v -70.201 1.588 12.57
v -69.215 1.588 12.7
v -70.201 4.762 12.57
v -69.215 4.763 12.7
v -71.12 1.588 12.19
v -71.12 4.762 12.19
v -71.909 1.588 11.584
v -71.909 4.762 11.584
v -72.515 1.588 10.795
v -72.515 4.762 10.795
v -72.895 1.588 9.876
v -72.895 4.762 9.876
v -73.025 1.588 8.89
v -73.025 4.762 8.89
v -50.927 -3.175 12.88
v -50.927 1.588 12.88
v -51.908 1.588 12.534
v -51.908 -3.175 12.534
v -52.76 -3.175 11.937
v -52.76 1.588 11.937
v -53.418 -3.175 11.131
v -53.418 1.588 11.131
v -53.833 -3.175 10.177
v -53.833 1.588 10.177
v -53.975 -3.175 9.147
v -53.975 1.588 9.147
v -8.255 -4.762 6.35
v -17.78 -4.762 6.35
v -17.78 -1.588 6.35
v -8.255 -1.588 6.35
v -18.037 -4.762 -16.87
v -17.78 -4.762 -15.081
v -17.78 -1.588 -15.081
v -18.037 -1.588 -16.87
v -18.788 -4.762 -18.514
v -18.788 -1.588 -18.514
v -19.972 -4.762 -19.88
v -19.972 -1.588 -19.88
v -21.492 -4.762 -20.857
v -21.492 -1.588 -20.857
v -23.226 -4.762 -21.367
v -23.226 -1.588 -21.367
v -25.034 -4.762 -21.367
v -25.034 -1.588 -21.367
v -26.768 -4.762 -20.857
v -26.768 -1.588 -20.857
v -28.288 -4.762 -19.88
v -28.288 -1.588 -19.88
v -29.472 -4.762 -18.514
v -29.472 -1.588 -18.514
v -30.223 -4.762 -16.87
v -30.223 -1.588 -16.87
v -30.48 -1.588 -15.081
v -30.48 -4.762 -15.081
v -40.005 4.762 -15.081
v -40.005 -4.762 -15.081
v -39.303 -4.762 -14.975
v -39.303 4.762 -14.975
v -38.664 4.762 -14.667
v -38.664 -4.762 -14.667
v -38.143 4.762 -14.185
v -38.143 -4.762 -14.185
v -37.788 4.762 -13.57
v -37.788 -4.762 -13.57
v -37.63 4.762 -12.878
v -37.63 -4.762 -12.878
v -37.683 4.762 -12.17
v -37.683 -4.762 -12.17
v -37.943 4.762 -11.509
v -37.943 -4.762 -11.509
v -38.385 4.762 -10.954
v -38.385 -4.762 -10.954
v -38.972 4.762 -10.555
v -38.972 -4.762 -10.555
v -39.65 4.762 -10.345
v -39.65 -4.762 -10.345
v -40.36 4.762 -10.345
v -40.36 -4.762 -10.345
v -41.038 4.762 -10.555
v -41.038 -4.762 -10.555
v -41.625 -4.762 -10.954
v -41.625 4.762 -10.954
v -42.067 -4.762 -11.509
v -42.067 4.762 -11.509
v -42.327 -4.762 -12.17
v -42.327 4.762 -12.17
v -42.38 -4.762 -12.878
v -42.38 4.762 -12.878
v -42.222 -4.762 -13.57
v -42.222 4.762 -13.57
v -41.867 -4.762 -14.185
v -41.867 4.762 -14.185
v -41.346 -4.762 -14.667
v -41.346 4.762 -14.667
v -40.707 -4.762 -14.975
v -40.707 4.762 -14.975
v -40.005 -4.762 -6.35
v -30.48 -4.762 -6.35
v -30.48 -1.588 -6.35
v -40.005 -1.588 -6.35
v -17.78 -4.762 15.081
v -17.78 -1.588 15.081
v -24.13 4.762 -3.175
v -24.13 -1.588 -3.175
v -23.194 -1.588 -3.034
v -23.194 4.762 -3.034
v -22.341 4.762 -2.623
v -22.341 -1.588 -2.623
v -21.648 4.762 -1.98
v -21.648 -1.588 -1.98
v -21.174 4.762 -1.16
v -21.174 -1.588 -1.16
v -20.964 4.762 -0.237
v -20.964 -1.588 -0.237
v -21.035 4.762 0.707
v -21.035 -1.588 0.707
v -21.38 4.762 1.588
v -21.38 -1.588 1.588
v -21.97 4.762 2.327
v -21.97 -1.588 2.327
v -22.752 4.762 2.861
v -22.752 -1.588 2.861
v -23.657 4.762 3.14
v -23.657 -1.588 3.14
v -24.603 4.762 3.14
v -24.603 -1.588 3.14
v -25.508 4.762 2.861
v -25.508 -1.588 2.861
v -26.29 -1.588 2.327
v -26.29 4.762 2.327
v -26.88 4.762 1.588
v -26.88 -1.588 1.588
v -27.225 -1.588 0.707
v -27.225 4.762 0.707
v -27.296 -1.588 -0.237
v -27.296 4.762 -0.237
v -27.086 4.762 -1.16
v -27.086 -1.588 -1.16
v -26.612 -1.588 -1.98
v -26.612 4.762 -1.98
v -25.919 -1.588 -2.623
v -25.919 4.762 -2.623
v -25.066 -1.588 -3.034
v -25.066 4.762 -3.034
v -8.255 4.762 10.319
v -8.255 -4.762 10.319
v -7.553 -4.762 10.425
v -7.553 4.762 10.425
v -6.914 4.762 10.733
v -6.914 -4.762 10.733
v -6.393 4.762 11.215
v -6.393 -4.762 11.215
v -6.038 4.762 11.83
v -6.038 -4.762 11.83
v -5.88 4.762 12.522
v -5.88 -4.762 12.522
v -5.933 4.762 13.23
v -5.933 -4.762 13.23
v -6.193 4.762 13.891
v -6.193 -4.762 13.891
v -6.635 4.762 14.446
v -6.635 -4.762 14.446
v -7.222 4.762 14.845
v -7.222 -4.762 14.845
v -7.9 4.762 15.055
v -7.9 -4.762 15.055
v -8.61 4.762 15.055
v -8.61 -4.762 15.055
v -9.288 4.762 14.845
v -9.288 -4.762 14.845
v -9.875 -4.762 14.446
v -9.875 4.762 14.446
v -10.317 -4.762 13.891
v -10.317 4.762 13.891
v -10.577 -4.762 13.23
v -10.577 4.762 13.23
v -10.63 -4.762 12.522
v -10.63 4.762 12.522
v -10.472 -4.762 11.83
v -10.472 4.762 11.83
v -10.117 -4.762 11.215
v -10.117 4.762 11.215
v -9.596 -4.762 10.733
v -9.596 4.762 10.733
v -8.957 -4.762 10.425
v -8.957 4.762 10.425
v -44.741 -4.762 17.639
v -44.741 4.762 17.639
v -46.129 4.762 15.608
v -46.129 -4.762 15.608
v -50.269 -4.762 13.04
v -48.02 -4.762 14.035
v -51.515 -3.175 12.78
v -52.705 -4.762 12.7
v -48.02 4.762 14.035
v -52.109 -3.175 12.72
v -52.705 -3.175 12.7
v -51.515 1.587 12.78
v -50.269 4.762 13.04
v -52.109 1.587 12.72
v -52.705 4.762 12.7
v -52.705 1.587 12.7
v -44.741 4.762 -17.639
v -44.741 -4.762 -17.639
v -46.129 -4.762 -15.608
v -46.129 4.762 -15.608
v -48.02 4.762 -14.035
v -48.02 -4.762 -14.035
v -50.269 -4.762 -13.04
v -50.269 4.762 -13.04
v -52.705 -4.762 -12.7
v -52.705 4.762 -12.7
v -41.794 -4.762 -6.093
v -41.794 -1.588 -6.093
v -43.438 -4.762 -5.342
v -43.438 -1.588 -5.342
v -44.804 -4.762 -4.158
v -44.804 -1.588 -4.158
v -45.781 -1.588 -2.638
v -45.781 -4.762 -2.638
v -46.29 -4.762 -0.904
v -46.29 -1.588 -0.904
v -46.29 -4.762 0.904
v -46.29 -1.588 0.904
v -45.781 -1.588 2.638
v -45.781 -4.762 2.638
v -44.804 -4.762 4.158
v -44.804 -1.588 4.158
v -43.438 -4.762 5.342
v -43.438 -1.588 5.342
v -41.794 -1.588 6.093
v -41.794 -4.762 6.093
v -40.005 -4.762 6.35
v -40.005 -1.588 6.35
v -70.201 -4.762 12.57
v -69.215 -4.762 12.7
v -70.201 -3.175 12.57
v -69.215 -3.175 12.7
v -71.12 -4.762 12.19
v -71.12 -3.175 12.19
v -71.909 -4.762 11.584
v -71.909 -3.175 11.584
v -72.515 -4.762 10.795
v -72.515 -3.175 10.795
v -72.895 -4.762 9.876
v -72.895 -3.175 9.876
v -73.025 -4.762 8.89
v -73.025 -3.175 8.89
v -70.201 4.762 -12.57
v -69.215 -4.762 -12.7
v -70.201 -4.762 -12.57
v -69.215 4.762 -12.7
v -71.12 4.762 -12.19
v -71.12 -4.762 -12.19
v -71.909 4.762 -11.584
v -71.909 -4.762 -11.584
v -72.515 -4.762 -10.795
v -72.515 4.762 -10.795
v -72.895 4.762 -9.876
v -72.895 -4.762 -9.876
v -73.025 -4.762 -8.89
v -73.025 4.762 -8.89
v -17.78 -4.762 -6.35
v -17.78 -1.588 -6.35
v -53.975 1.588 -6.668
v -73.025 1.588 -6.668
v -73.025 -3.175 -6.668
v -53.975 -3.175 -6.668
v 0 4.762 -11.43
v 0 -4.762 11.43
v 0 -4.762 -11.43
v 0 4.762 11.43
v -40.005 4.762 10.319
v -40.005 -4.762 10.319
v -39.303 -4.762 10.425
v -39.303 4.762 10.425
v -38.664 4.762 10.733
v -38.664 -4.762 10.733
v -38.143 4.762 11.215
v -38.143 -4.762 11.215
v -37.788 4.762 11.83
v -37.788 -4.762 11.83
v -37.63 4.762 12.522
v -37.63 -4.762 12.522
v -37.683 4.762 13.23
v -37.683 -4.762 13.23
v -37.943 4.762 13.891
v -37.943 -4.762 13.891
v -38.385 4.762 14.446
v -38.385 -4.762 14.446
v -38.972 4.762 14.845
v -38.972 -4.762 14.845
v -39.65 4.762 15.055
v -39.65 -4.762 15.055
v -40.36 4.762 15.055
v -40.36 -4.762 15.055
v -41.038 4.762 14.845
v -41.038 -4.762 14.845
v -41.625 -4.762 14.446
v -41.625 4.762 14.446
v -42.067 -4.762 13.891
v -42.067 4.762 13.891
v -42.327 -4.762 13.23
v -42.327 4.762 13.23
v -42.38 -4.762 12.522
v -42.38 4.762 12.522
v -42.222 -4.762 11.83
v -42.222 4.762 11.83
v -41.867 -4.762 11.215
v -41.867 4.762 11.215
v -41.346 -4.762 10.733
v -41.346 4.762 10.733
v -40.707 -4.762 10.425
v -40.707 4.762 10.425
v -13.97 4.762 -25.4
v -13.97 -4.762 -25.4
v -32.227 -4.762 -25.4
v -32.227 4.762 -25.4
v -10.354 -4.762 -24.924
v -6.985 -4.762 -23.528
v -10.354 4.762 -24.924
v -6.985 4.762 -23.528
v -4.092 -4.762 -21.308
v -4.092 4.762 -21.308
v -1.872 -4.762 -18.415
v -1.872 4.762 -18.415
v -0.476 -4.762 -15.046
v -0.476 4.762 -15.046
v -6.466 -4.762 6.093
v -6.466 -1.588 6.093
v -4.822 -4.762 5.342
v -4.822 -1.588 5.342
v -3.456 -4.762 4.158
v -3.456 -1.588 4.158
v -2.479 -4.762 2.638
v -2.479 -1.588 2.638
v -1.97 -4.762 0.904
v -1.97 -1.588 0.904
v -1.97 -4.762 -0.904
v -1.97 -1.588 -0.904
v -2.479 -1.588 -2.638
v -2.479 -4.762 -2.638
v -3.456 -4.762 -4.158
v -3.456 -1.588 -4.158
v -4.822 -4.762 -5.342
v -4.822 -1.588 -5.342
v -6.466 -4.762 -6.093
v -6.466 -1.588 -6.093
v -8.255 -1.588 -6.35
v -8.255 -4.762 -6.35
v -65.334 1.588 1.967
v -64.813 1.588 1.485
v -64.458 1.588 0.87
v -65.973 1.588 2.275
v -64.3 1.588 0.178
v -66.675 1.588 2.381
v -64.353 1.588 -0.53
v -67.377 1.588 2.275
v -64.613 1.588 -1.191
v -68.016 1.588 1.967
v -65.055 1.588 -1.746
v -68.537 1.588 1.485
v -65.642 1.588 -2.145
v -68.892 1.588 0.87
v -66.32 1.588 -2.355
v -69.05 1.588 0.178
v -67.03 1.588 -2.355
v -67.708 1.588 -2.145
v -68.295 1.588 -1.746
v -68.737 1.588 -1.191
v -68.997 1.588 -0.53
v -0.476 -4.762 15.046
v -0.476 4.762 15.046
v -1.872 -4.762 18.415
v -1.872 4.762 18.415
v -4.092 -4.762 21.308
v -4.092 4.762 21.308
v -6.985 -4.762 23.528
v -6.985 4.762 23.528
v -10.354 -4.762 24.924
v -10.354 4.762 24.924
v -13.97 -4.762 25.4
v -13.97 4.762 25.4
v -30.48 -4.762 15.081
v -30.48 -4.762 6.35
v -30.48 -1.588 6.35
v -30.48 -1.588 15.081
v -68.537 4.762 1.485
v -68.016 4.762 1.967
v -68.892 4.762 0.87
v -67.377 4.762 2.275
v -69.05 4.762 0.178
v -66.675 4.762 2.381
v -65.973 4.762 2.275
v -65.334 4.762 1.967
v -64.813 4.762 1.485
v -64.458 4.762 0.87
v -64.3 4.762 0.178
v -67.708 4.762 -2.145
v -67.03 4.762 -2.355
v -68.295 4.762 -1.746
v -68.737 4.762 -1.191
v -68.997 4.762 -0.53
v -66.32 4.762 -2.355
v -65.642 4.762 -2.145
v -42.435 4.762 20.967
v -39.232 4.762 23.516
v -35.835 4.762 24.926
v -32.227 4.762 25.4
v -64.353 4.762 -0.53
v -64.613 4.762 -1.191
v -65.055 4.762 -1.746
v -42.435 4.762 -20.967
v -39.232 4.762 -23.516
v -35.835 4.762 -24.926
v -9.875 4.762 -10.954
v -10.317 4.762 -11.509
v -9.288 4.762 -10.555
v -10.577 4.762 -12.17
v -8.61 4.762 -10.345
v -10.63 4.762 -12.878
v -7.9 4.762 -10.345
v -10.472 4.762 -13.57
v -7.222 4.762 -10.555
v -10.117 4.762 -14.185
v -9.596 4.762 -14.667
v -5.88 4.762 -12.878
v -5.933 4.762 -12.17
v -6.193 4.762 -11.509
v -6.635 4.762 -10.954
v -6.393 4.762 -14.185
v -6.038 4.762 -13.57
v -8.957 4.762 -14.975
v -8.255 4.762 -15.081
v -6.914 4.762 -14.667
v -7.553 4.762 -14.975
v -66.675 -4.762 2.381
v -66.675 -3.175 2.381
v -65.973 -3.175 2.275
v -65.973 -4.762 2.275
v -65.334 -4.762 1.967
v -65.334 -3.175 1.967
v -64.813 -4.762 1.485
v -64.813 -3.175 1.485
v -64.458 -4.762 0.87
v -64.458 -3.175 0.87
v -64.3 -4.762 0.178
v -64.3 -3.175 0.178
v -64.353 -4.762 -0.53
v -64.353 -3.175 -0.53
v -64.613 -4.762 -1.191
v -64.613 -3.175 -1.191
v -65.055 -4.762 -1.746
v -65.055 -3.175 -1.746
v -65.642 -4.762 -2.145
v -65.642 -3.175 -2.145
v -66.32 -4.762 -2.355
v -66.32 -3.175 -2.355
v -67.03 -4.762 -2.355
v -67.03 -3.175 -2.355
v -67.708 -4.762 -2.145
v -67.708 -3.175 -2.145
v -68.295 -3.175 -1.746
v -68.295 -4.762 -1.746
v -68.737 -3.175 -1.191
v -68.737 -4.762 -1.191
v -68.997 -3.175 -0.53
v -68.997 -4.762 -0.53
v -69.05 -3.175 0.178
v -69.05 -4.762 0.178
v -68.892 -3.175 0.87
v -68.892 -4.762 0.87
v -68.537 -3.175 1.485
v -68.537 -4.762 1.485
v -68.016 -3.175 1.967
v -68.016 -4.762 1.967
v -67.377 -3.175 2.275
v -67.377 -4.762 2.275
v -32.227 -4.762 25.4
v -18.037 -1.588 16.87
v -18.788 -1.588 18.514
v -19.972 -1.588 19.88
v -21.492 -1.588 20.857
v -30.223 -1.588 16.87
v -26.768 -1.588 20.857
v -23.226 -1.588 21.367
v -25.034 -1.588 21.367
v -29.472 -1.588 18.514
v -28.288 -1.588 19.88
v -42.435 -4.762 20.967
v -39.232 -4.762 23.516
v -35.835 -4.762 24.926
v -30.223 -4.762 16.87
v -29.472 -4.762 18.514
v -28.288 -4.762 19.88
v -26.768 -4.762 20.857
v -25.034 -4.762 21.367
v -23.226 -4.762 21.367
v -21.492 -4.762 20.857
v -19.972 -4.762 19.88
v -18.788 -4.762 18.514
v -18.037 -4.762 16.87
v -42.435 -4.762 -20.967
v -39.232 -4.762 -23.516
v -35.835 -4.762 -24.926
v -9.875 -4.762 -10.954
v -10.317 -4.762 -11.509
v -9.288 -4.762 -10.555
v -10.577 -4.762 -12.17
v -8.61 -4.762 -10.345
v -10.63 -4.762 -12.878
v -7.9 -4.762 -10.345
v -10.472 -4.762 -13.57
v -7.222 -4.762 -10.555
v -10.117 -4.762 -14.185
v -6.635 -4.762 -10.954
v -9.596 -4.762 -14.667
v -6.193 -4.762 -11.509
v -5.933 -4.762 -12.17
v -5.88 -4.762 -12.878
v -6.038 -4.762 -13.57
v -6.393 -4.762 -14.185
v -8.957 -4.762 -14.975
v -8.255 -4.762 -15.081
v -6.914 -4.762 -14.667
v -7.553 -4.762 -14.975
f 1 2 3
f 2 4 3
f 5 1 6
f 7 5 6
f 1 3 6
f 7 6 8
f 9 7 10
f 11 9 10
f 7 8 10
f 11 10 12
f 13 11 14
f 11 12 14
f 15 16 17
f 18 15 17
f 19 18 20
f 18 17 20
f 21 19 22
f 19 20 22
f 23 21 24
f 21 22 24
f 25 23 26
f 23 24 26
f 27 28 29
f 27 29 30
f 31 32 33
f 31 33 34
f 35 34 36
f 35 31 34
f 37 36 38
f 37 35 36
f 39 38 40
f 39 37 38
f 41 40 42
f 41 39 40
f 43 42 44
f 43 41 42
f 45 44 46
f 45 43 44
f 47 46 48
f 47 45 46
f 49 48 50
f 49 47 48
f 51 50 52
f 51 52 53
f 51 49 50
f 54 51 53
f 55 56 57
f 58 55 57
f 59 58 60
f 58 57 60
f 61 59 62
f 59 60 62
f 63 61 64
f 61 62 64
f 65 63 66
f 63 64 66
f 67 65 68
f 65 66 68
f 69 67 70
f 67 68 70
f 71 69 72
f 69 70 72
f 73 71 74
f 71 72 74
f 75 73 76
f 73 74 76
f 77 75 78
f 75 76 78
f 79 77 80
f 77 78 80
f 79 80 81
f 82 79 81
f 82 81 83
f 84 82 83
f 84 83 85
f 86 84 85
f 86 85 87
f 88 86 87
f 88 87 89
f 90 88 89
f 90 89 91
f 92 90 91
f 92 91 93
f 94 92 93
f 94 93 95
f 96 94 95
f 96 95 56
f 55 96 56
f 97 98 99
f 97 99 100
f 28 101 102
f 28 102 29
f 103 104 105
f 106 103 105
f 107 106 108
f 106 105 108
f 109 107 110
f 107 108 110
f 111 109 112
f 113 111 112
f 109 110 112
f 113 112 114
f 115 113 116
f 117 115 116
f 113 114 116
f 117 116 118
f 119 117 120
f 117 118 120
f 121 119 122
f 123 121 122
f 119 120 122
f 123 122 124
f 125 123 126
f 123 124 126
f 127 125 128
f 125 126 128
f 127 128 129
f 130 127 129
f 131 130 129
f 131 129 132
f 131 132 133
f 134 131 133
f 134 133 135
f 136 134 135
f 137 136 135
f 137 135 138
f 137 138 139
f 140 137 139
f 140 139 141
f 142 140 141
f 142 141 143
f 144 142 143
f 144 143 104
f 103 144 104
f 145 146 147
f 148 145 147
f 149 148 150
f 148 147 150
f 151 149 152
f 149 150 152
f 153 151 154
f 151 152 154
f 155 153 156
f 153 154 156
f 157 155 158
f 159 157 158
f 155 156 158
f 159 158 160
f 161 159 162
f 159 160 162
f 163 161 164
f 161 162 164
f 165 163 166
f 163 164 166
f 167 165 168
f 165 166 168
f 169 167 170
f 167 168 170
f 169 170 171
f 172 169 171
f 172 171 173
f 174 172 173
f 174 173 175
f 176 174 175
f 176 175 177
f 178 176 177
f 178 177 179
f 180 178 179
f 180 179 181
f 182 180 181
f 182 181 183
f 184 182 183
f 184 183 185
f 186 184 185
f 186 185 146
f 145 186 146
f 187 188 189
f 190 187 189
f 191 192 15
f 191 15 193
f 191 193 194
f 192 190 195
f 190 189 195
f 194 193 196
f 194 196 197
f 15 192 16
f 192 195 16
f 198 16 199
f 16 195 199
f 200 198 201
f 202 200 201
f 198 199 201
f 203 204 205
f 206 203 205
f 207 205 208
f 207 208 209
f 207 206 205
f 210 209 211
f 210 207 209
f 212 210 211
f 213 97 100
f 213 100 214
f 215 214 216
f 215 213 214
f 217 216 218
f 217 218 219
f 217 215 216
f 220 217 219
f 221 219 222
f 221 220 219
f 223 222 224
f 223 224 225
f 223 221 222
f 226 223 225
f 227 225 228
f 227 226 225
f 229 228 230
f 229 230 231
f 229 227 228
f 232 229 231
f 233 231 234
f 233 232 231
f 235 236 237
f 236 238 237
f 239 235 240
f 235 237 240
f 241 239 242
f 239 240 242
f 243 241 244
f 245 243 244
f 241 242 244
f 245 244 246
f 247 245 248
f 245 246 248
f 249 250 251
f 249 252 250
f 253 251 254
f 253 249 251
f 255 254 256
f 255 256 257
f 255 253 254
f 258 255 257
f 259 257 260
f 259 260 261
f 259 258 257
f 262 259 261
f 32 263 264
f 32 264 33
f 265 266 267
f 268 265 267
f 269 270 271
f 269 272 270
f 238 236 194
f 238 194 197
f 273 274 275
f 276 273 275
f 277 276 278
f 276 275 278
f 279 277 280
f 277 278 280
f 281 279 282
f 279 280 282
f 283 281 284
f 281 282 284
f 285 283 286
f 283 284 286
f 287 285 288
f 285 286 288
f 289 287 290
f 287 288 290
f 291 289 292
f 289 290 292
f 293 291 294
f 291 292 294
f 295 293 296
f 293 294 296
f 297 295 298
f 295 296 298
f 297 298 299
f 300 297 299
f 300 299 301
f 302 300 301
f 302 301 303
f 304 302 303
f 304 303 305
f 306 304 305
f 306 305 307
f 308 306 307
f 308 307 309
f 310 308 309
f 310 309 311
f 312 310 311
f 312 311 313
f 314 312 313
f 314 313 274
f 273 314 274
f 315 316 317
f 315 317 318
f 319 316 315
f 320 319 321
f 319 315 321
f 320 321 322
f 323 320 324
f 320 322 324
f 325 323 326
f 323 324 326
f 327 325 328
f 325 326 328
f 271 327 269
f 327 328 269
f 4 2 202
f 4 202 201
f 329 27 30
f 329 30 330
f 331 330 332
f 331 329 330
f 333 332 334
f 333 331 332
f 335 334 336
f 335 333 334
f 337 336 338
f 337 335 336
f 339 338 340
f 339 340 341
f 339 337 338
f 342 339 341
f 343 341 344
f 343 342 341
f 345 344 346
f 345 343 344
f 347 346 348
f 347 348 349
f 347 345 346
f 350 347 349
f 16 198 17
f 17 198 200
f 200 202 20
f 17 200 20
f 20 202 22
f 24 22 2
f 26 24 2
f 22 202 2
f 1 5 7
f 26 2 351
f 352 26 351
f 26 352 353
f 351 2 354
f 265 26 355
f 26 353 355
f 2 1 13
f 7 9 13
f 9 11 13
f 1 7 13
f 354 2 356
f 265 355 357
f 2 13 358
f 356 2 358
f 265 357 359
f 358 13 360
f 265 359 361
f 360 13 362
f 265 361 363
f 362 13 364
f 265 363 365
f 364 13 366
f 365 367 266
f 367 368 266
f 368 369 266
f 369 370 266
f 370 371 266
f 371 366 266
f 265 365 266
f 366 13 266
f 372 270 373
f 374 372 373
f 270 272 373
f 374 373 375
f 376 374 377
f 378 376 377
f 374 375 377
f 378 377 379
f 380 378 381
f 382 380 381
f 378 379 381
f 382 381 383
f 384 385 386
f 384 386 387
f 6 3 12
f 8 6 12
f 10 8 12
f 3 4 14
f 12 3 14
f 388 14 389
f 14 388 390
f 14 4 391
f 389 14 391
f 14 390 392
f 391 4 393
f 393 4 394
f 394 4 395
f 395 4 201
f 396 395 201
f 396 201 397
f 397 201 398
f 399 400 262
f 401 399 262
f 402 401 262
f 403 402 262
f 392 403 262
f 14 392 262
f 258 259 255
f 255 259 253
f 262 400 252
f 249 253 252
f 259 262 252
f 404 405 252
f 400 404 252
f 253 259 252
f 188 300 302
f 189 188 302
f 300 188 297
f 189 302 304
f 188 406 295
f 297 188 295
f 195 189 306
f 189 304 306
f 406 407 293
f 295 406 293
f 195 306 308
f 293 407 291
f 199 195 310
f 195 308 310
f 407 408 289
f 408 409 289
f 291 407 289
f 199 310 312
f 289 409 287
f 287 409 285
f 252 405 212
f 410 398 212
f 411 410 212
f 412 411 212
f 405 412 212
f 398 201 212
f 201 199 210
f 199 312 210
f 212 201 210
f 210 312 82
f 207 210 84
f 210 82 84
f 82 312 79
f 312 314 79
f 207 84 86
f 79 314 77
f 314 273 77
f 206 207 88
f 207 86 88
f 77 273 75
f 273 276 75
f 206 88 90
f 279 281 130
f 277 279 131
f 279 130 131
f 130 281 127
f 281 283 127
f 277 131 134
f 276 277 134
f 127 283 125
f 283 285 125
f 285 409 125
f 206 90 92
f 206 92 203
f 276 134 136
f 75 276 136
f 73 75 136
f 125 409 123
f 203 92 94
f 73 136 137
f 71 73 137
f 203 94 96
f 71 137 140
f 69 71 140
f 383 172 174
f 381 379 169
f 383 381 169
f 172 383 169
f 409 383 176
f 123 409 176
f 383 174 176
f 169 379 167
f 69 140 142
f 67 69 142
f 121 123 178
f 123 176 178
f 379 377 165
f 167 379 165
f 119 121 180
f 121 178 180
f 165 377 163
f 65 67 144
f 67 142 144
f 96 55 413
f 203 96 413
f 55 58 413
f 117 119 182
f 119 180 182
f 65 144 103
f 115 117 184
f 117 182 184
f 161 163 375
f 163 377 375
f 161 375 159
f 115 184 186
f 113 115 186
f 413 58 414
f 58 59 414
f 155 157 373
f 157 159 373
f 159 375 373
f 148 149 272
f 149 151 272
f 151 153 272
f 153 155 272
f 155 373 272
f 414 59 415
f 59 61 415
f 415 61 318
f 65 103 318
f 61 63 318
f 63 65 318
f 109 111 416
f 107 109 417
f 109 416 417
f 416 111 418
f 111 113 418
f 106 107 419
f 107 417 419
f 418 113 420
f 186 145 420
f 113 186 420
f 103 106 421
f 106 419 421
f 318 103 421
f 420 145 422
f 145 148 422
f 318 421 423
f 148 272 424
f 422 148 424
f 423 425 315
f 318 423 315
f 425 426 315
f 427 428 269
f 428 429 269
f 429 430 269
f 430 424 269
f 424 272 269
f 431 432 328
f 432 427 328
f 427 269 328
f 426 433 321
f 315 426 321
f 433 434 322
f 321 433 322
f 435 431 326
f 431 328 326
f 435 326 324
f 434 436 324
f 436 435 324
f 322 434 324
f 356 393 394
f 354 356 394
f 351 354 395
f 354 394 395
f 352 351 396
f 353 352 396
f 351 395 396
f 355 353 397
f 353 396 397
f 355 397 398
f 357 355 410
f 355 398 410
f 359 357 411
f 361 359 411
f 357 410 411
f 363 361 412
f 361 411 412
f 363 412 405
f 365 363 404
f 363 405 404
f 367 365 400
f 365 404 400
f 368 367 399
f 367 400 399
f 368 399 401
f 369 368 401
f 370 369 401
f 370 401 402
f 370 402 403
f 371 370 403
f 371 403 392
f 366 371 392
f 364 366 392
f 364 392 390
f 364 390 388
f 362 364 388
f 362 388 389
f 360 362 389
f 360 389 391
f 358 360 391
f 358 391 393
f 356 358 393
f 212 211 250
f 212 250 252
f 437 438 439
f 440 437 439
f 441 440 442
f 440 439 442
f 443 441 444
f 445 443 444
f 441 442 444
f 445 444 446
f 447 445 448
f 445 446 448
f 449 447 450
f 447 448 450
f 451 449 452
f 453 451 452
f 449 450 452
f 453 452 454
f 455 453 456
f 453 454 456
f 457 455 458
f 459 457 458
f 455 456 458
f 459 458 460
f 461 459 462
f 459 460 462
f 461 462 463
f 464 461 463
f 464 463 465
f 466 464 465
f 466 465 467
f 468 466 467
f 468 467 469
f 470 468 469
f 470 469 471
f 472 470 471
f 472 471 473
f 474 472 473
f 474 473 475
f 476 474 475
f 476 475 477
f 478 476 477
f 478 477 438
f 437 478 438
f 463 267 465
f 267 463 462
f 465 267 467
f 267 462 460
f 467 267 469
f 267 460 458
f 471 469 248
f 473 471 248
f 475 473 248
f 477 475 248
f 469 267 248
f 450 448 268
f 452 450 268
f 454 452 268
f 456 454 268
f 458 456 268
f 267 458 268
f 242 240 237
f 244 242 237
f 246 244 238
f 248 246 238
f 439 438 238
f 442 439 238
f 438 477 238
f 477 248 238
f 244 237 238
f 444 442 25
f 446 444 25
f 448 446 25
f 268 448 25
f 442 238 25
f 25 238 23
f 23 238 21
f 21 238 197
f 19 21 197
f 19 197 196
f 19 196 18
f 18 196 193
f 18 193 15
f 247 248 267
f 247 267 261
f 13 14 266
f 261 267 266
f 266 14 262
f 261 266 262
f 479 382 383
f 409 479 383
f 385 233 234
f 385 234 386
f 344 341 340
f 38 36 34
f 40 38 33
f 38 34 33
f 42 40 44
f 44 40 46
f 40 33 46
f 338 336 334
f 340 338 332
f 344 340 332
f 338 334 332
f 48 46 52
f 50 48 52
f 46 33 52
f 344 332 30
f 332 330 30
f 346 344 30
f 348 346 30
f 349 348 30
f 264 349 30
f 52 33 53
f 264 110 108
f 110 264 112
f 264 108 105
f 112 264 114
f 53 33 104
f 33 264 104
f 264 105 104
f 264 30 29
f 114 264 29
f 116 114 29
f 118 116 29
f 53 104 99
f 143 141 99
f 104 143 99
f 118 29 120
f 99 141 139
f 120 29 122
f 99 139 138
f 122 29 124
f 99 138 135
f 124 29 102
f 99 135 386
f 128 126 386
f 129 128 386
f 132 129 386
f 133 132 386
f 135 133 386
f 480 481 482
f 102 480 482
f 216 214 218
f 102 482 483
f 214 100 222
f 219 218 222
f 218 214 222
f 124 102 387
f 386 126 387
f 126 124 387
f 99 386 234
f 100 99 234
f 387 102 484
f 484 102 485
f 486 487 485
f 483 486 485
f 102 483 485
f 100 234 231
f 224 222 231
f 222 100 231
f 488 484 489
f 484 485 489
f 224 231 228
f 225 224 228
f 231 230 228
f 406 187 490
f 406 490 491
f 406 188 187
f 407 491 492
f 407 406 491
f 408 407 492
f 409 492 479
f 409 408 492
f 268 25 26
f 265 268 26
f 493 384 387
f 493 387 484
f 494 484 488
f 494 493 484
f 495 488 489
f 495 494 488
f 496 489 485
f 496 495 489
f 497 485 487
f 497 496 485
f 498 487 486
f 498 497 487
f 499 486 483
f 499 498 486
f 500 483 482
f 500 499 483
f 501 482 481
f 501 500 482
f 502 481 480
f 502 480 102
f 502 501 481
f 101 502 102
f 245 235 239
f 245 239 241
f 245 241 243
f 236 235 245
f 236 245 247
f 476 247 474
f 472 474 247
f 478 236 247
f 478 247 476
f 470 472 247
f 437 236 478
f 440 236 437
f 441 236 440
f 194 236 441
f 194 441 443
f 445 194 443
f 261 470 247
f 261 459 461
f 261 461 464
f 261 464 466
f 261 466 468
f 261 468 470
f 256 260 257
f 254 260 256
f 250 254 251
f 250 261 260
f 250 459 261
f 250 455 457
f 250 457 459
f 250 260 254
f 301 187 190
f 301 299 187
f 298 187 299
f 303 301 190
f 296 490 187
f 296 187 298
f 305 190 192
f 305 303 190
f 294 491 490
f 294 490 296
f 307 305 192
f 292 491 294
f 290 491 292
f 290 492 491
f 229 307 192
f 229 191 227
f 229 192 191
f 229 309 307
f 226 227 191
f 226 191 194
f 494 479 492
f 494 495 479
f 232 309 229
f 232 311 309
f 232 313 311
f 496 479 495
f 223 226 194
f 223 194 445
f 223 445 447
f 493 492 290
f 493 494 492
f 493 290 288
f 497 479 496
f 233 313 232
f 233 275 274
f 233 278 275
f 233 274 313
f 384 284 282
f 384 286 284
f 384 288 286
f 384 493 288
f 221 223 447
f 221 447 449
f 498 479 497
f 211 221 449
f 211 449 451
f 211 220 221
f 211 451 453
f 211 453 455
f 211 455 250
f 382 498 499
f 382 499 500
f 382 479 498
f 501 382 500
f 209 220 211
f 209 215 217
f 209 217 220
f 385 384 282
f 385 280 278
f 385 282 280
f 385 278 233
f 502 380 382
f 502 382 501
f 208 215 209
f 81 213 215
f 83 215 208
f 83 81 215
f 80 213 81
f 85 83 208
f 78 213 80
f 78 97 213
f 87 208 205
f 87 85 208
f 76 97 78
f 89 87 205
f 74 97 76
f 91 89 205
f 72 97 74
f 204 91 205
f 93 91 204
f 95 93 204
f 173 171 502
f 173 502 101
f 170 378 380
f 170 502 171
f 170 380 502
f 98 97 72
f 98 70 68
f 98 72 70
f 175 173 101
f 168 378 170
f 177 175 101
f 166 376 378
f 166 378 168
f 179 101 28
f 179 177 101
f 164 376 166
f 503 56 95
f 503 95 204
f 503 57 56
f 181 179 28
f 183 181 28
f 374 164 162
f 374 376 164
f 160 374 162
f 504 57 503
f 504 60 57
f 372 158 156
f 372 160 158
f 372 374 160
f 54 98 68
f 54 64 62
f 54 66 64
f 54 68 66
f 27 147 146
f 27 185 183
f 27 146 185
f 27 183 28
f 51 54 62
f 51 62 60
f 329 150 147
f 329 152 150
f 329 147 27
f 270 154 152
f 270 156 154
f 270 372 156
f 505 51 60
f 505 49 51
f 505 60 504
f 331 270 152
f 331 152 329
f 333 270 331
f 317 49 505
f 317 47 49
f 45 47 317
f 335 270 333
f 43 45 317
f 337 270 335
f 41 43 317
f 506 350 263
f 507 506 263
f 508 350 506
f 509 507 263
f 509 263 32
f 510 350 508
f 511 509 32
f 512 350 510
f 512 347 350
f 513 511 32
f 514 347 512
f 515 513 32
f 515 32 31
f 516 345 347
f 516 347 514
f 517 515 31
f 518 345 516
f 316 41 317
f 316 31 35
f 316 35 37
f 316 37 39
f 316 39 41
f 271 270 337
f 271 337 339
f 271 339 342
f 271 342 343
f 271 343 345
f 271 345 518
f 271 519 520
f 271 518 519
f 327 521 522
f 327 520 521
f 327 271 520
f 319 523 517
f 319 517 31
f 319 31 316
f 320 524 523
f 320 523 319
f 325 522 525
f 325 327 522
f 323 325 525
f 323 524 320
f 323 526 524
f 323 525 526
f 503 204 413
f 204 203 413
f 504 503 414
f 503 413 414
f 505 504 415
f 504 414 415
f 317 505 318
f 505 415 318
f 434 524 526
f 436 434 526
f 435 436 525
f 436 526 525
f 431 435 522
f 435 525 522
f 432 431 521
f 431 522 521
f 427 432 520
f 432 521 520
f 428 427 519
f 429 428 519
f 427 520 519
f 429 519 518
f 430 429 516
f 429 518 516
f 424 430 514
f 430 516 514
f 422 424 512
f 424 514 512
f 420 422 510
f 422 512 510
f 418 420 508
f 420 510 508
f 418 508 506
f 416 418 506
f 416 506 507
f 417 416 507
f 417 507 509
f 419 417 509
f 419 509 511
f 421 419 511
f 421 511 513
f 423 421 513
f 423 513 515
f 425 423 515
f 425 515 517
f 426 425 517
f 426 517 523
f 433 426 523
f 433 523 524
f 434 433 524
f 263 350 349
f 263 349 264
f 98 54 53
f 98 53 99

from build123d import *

# Parameters (mm, degrees)
SKETCH1_W           = 50.8
SKETCH1_H           = 9.525
BOSS_EXTRUDE1_DEPTH = 73.025
CUT_EXTRUDE2_DEPTH  = 19.05
SKETCH4_R           = 2.38125
CUT_EXTRUDE3_DEPTH  = 78.90081033
SKETCH5_W           = 12.7
SKETCH5_H           = 9.525
CUT_EXTRUDE4_DEPTH  = 29.21
FILLET2_R           = 8.89
FILLET3_R           = 3.81
FILLET4_R           = 13.97
FILLET5_R           = 13.97
CUT_EXTRUDE10_DEPTH = 3.175
SKETCH14_R          = 3.175
CUT_EXTRUDE11_DEPTH = 78.576627575
SKETCH17_R          = 2.38125
CUT_EXTRUDE12_DEPTH = 78.900810468
SKETCH19_W          = 19.05
SKETCH19_H          = 4.7625
CUT_EXTRUDE14_DEPTH = 6.0325
FILLET8_R           = 3.81
FILLET9_R           = 3.81


with BuildPart() as part:
    # Sketch1 → Boss-Extrude1 (new body)
    with BuildSketch(Plane(origin=(0, 0, 0), x_dir=(0, 0, -1), z_dir=(1, 0, 0))):
        Rectangle(SKETCH1_W, SKETCH1_H)
    extrude(amount=-BOSS_EXTRUDE1_DEPTH)

    # Sketch3 → Cut-Extrude2 (cut)
    with BuildSketch(Plane.ZY.offset(73.025)):
        Polygon((-6.6675, -3.175), (6.6675, -3.175), (6.6675, -0.79375), (6.6675, 1.5875), (-6.6675, 1.5875), (-6.6675, -0.79375), align=None)
    extrude(amount=-CUT_EXTRUDE2_DEPTH, mode=Mode.SUBTRACT)

    # Sketch4 → Cut-Extrude3 (cut, through all)
    with BuildSketch(Plane(origin=(0, 4.7625, 0), x_dir=(1, 0, 0), z_dir=(0, 1, 0))):
        with Locations(Location((-66.675, 0, 0), (0, 0, 270))):
            Circle(SKETCH4_R)
    extrude(amount=-CUT_EXTRUDE3_DEPTH, mode=Mode.SUBTRACT)

    # Sketch5 → Cut-Extrude4 (cut)
    with BuildSketch(Plane.ZY.offset(73.025)):
        with Locations((-19.05, 0)):
            Rectangle(SKETCH5_W, SKETCH5_H)
        with Locations((19.05, 0)):
            Rectangle(SKETCH5_W, SKETCH5_H)
    extrude(amount=-CUT_EXTRUDE4_DEPTH, mode=Mode.SUBTRACT)

    # Fillet2
    fillet2_edges = [part.edges().sort_by_distance(p)[0] for p in [
        (-43.815, 0, -12.7),
        (-43.815, 0, 12.7),
    ]]
    fillet(fillet2_edges, radius=FILLET2_R)

    # Fillet3
    fillet3_edges = [part.edges().sort_by_distance(p)[0] for p in [
        (-73.025, 0, -12.7),
    ]]
    fillet(fillet3_edges, radius=FILLET3_R)

    # Fillet4
    fillet4_edges = [part.edges().sort_by_distance(p)[0] for p in [
        (-43.815, 0, 25.4),
        (-43.815, 0, -25.4),
    ]]
    fillet(fillet4_edges, radius=FILLET4_R)

    # Fillet5
    fillet5_edges = [part.edges().sort_by_distance(p)[0] for p in [
        (0, 0, 25.4),
        (0, 0, -25.4),
    ]]
    fillet(fillet5_edges, radius=FILLET5_R)

    # Sketch13 → Cut-Extrude10 (cut)
    with BuildSketch(Plane.XZ.offset(4.7625)):
        with BuildLine():
            Line((-30.48, 6.35), (-30.48, 15.08125))
            ThreePointArc((-30.48, 15.08125), (-24.13, 21.43125), (-17.78, 15.08125))
            Line((-17.78, 15.08125), (-17.78, 6.35))
            Line((-17.78, 6.35), (-8.255, 6.35))
            ThreePointArc((-8.255, 6.35), (-1.905, 0), (-8.255, -6.35))
            Line((-8.255, -6.35), (-17.78, -6.35))
            Line((-17.78, -6.35), (-17.78, -15.08125))
            ThreePointArc((-17.78, -15.08125), (-24.13, -21.43125), (-30.48, -15.08125))
            Line((-30.48, -15.08125), (-30.48, -6.35))
            Line((-30.48, -6.35), (-40.005, -6.35))
            ThreePointArc((-40.005, -6.35), (-46.355, 0), (-40.005, 6.35))
            Line((-40.005, 6.35), (-30.48, 6.35))
        make_face()
    extrude(amount=-CUT_EXTRUDE10_DEPTH, mode=Mode.SUBTRACT)

    # Sketch14 → Cut-Extrude11 (cut, through all)
    with BuildSketch(Plane.XZ.offset(1.5875)):
        with Locations(Location((-24.13, 0, 0), (0, 0, 270))):
            Circle(SKETCH14_R)
    extrude(amount=-CUT_EXTRUDE11_DEPTH, mode=Mode.SUBTRACT)

    # Sketch17 → Cut-Extrude12 (cut, through all)
    with BuildSketch(Plane(origin=(0, -4.7625, 0), x_dir=(-1, 0, 0), z_dir=(0, -1, 0))):
        with Locations(Location((40.005, -12.7, 0), (0, 0, 90))):
            Circle(SKETCH17_R)
        with Locations(Location((40.005, 12.7, 0), (0, 0, 90))):
            Circle(SKETCH17_R)
        with Locations(Location((8.255, -12.7, 0), (0, 0, 90))):
            Circle(SKETCH17_R)
        with Locations(Location((8.255, 12.7, 0), (0, 0, 90))):
            Circle(SKETCH17_R)
    extrude(amount=-CUT_EXTRUDE12_DEPTH, mode=Mode.SUBTRACT)

    # Sketch19 → Cut-Extrude14 (cut)
    with BuildSketch(Plane.XY.offset(12.7)):
        with Locations((-63.5, -0.79375)):
            Rectangle(SKETCH19_W, SKETCH19_H)
    extrude(amount=-CUT_EXTRUDE14_DEPTH, mode=Mode.SUBTRACT)

    # Fillet8
    # the kernel refuses this fillet: 3.81 mm, written as the material it takes off along each edge
    with BuildSketch(Plane(origin=(-53.975, 1.5875, 12.7), x_dir=(0, 0, -1), z_dir=(0, -1, 0))) as fillet8_piece_1:
        with BuildLine():
            CenterArc((3.553407893, 3.81), FILLET8_R, 191.536959033, 78.463040967)
            Line((-0.179614475, 3.048), (-0.552916711, 2.9718))
            ThreePointArc((-0.552916711, 2.9718), (-0.381, 1.27), (-0.381, 0))
            Line((-0.381, 0), (0, -0.381))
            Line((0, -0.381), (3.553407893, -0.381))
            Line((3.553407893, -0.381), (3.553407893, 0))
        make_face()
    extrude(amount=4.7625, mode=Mode.SUBTRACT)

    # Fillet9
    fillet9_edges = [part.edges().sort_by_distance(p)[0] for p in [
        (-73.025, -3.96875, 12.7),
        (-73.025, 3.175, 12.7),
    ]]
    fillet(fillet9_edges, radius=FILLET9_R)


solid = part.part
